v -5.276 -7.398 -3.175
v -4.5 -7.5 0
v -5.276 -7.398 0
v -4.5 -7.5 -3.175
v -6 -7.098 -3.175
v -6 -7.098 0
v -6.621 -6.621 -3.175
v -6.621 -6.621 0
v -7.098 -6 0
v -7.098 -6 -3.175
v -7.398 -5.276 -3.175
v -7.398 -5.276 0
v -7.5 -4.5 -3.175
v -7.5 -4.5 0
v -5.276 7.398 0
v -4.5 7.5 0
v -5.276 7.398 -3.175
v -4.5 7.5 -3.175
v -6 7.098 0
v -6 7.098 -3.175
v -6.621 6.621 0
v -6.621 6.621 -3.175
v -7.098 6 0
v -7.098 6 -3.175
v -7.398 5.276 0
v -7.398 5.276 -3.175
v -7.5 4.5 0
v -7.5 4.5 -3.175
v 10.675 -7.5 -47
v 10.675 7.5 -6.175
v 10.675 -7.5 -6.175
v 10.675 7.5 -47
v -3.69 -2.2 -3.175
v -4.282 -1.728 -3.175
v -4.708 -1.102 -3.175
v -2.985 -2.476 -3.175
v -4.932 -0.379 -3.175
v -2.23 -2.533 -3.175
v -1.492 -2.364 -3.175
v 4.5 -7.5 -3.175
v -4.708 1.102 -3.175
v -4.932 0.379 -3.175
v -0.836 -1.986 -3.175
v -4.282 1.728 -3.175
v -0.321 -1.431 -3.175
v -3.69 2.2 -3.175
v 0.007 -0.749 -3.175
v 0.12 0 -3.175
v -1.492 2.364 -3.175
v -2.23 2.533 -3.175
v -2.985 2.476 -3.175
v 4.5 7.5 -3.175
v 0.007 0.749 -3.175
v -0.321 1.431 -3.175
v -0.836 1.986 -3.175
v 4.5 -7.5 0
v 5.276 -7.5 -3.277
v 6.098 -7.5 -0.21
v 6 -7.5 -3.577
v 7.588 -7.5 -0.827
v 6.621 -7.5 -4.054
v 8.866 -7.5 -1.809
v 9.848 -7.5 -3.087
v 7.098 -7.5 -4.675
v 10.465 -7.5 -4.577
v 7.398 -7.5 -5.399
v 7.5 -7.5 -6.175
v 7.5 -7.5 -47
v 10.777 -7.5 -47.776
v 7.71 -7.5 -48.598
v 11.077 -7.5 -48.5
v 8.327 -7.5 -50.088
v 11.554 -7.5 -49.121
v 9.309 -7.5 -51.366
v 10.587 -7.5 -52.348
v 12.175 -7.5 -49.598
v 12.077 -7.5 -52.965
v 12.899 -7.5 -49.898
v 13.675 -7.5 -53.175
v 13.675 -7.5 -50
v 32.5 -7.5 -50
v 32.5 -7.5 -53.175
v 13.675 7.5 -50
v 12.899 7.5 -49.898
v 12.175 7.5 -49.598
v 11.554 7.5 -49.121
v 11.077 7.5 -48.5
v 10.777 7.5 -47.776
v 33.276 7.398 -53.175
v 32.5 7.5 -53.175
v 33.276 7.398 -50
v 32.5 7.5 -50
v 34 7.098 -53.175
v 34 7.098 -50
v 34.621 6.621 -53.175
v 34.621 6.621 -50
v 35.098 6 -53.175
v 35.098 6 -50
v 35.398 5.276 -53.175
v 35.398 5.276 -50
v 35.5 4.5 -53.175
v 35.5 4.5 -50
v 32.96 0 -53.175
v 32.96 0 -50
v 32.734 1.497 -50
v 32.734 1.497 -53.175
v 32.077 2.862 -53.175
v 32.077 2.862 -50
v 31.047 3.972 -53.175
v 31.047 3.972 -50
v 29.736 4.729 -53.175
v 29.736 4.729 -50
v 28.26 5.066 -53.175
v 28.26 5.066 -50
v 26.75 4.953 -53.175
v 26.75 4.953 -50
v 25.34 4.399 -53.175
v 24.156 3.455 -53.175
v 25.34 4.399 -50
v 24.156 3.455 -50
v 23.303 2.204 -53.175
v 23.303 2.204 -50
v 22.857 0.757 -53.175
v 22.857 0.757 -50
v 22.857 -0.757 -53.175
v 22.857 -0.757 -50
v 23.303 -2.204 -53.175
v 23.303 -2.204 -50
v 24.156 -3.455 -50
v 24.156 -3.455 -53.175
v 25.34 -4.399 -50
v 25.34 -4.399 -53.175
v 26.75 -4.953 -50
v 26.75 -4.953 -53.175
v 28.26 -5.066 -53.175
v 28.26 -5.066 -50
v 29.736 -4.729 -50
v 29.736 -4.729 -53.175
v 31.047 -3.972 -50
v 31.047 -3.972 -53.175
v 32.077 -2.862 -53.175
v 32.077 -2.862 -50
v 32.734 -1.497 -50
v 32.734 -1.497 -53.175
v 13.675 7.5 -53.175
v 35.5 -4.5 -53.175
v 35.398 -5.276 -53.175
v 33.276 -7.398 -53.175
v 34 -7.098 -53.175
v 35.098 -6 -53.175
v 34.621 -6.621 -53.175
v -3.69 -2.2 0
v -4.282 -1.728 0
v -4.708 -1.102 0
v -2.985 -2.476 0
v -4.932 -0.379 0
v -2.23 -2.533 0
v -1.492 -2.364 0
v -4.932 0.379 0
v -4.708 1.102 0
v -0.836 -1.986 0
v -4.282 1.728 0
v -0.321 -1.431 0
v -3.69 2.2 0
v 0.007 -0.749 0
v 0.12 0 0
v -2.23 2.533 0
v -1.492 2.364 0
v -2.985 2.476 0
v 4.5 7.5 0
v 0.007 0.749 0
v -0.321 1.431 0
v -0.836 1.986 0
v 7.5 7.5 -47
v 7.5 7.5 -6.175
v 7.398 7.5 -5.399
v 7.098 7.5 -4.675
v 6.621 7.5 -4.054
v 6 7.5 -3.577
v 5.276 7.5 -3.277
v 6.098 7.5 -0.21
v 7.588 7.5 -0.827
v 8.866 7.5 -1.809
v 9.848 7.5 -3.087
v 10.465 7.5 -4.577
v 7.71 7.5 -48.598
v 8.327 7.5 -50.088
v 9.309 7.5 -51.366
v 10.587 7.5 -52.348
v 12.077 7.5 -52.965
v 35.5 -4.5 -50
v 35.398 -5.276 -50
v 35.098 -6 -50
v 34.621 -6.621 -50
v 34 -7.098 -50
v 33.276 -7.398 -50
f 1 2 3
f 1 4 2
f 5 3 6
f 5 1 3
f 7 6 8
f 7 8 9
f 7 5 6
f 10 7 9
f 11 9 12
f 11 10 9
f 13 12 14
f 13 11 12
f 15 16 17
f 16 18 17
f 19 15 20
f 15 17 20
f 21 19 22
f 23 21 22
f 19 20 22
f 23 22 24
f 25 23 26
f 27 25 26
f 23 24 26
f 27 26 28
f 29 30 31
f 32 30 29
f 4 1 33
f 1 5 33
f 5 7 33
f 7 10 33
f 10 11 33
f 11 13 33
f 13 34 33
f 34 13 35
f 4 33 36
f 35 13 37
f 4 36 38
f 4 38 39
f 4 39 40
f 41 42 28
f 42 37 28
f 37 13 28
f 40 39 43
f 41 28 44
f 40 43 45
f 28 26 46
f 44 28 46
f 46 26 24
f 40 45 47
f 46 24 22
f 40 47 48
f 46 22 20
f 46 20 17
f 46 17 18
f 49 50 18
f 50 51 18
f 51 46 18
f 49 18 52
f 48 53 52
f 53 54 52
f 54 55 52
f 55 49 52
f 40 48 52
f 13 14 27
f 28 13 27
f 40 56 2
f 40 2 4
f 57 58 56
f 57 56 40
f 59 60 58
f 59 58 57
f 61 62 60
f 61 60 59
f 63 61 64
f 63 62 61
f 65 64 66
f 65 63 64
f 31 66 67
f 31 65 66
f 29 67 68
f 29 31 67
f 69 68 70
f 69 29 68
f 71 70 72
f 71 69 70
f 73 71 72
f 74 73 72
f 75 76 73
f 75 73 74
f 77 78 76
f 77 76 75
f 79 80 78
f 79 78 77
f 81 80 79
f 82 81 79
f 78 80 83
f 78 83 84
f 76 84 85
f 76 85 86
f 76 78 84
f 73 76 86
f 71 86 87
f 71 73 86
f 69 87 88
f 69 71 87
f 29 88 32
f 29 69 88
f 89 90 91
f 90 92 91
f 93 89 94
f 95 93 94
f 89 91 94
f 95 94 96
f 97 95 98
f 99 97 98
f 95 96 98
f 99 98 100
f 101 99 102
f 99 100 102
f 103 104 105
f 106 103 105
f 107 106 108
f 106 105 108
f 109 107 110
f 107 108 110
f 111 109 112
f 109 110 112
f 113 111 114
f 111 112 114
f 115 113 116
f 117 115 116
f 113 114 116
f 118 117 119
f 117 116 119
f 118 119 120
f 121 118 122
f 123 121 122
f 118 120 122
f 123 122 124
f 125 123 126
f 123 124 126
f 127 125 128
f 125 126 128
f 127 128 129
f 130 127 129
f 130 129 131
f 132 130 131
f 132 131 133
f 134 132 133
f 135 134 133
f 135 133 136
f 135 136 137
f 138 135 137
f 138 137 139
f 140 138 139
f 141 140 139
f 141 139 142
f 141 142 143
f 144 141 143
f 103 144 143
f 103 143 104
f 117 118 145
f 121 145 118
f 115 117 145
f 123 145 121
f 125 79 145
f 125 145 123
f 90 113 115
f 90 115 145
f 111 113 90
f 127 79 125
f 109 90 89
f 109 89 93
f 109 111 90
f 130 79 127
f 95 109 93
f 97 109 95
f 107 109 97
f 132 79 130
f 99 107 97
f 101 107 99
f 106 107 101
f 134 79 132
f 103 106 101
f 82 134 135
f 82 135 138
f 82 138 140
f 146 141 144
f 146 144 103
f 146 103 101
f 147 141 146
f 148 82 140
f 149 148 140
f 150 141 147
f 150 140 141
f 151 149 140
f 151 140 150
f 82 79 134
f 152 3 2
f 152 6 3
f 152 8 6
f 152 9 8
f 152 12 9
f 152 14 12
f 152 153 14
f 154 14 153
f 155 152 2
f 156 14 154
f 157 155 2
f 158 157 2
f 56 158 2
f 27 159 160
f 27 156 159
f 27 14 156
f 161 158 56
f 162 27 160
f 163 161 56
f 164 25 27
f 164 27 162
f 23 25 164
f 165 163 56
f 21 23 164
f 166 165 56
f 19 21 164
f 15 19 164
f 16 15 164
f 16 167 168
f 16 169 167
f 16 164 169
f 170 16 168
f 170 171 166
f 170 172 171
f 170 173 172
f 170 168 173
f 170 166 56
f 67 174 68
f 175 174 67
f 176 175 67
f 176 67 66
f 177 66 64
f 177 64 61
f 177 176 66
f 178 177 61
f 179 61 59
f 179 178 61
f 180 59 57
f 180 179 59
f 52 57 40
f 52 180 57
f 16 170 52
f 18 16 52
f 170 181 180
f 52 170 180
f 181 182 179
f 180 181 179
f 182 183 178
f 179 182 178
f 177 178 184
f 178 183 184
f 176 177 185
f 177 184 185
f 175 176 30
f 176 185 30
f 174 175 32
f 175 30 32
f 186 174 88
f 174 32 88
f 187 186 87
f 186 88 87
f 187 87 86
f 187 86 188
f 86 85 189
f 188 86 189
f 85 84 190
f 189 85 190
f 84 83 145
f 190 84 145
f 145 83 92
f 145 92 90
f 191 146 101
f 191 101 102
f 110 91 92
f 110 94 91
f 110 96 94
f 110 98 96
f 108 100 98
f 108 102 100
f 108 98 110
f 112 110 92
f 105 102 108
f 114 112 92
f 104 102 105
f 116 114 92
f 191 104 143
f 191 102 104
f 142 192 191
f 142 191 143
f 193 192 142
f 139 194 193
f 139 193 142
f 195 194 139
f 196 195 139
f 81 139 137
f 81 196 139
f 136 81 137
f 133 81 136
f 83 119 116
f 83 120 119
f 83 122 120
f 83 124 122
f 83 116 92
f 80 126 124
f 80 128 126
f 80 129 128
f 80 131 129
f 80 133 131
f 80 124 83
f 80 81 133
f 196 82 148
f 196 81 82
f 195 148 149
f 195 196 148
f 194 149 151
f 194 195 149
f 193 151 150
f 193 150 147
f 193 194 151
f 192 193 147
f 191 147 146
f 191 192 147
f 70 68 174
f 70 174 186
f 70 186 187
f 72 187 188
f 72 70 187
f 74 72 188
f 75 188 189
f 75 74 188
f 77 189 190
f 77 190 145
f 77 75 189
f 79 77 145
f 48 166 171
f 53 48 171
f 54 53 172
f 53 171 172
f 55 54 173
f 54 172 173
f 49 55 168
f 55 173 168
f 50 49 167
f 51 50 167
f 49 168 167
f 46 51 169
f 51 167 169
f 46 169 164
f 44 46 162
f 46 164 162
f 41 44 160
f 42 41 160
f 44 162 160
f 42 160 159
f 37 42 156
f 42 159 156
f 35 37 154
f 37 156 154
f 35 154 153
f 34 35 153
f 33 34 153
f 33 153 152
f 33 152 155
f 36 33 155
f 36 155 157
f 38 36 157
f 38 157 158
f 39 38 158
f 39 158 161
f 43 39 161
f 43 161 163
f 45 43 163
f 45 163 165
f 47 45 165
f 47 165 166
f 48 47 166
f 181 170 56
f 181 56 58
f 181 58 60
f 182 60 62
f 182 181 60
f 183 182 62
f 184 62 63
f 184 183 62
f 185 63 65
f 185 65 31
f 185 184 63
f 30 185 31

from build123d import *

# Parameters (mm, degrees)
SKETCH1_W                    = 15
SKETCH1_H                    = 15
BASE_FLANGE2_DEPTH           = 3.175
EDGE_FLANGE1_STRIP_W         = 18.7
EDGE_FLANGE1_STRIP_H         = 3.175
EDGE_FLANGE1_STRIP_CUT_DEPTH = 15
EDGE_FLANGE1_DEPTH           = 15
EDGE_FLANGE2_STRIP_W         = 18.7
EDGE_FLANGE2_STRIP_H         = 3.175
EDGE_FLANGE2_STRIP_CUT_DEPTH = 15
EDGE_FLANGE2_DEPTH           = 15
SKETCH18_R                   = 2.54
CUT_EXTRUDE1_DEPTH           = 65.374533979
SKETCH19_R                   = 5.08
CUT_EXTRUDE2_DEPTH           = 62.777827738
FILLET1_R                    = 3


# Sheet-metal steps are written as plain solids
with BuildPart() as part:
    # Sketch1 → Base-Flange2 (new body)
    with BuildSketch(Plane.XY):
        Rectangle(SKETCH1_W, SKETCH1_H)
    extrude(amount=-BASE_FLANGE2_DEPTH)

    # Edge-Flange1 strip (across the edge) → Edge-Flange1 strip cut (cut)
    with BuildSketch(Plane(origin=(7.5, 7.5, -3.175), x_dir=(-1, 0, 0), z_dir=(0, -1, 0))):
        with Locations((-6.35, -1.5875)):
            Rectangle(EDGE_FLANGE1_STRIP_W, EDGE_FLANGE1_STRIP_H)
    extrude(amount=EDGE_FLANGE1_STRIP_CUT_DEPTH, mode=Mode.SUBTRACT)

    # Edge-Flange1 section (across the edge) → Edge-Flange1 (add)
    with BuildSketch(Plane(origin=(7.5, 7.5, -3.175), x_dir=(-1, 0, 0), z_dir=(0, -1, 0))):
        with BuildLine():
            Line((-3.175, 3), (-3.175, 46.825))
            Line((-3.175, 46.825), (0, 46.825))
            Line((0, 46.825), (0, 3))
            ThreePointArc((0, 3), (0.878679656, 0.878679656), (3, 0))
            Line((3, 0), (3, -3.175))
            ThreePointArc((3, -3.175), (-1.366384374, -1.366384374), (-3.175, 3))
        make_face()
    extrude(amount=EDGE_FLANGE1_DEPTH)

    # Edge-Flange2 strip (across the edge) → Edge-Flange2 strip cut (cut)
    with BuildSketch(Plane(origin=(10.675, -7.5, -50), x_dir=(0, 0, 1), z_dir=(0, 1, 0))):
        with Locations((-6.35, -1.5875)):
            Rectangle(EDGE_FLANGE2_STRIP_W, EDGE_FLANGE2_STRIP_H)
    extrude(amount=EDGE_FLANGE2_STRIP_CUT_DEPTH, mode=Mode.SUBTRACT)

    # Edge-Flange2 section (across the edge) → Edge-Flange2 (add)
    with BuildSketch(Plane(origin=(10.675, -7.5, -50), x_dir=(0, 0, 1), z_dir=(0, 1, 0))):
        with BuildLine():
            Line((-3.175, 3), (-3.175, 24.825))
            Line((-3.175, 24.825), (0, 24.825))
            Line((0, 24.825), (0, 3))
            ThreePointArc((0, 3), (0.878679656, 0.878679656), (3, 0))
            Line((3, 0), (3, -3.175))
            ThreePointArc((3, -3.175), (-1.366384374, -1.366384374), (-3.175, 3))
        make_face()
    extrude(amount=EDGE_FLANGE2_DEPTH)

    # Sketch18 → Cut-Extrude1 (cut, through all)
    with BuildSketch(Plane.XY):
        with Locations((-2.42, 0)):
            Circle(SKETCH18_R)
    extrude(amount=-CUT_EXTRUDE1_DEPTH, mode=Mode.SUBTRACT)

    # Sketch19 → Cut-Extrude2 (cut, through all)
    with BuildSketch(Plane.XY.offset(-50)):
        with Locations((27.88, 0)):
            Circle(SKETCH19_R)
    extrude(amount=-CUT_EXTRUDE2_DEPTH, mode=Mode.SUBTRACT)

    # Fillet1
    fillet1_edges = [part.edges().sort_by_distance(p)[0] for p in [
        (35.5, -7.5, -51.5875),
        (35.5, 7.5, -51.5875),
        (-7.5, -7.5, -1.5875),
        (-7.5, 7.5, -1.5875),
    ]]
    fillet(fillet1_edges, radius=FILLET1_R)


solid = part.part
